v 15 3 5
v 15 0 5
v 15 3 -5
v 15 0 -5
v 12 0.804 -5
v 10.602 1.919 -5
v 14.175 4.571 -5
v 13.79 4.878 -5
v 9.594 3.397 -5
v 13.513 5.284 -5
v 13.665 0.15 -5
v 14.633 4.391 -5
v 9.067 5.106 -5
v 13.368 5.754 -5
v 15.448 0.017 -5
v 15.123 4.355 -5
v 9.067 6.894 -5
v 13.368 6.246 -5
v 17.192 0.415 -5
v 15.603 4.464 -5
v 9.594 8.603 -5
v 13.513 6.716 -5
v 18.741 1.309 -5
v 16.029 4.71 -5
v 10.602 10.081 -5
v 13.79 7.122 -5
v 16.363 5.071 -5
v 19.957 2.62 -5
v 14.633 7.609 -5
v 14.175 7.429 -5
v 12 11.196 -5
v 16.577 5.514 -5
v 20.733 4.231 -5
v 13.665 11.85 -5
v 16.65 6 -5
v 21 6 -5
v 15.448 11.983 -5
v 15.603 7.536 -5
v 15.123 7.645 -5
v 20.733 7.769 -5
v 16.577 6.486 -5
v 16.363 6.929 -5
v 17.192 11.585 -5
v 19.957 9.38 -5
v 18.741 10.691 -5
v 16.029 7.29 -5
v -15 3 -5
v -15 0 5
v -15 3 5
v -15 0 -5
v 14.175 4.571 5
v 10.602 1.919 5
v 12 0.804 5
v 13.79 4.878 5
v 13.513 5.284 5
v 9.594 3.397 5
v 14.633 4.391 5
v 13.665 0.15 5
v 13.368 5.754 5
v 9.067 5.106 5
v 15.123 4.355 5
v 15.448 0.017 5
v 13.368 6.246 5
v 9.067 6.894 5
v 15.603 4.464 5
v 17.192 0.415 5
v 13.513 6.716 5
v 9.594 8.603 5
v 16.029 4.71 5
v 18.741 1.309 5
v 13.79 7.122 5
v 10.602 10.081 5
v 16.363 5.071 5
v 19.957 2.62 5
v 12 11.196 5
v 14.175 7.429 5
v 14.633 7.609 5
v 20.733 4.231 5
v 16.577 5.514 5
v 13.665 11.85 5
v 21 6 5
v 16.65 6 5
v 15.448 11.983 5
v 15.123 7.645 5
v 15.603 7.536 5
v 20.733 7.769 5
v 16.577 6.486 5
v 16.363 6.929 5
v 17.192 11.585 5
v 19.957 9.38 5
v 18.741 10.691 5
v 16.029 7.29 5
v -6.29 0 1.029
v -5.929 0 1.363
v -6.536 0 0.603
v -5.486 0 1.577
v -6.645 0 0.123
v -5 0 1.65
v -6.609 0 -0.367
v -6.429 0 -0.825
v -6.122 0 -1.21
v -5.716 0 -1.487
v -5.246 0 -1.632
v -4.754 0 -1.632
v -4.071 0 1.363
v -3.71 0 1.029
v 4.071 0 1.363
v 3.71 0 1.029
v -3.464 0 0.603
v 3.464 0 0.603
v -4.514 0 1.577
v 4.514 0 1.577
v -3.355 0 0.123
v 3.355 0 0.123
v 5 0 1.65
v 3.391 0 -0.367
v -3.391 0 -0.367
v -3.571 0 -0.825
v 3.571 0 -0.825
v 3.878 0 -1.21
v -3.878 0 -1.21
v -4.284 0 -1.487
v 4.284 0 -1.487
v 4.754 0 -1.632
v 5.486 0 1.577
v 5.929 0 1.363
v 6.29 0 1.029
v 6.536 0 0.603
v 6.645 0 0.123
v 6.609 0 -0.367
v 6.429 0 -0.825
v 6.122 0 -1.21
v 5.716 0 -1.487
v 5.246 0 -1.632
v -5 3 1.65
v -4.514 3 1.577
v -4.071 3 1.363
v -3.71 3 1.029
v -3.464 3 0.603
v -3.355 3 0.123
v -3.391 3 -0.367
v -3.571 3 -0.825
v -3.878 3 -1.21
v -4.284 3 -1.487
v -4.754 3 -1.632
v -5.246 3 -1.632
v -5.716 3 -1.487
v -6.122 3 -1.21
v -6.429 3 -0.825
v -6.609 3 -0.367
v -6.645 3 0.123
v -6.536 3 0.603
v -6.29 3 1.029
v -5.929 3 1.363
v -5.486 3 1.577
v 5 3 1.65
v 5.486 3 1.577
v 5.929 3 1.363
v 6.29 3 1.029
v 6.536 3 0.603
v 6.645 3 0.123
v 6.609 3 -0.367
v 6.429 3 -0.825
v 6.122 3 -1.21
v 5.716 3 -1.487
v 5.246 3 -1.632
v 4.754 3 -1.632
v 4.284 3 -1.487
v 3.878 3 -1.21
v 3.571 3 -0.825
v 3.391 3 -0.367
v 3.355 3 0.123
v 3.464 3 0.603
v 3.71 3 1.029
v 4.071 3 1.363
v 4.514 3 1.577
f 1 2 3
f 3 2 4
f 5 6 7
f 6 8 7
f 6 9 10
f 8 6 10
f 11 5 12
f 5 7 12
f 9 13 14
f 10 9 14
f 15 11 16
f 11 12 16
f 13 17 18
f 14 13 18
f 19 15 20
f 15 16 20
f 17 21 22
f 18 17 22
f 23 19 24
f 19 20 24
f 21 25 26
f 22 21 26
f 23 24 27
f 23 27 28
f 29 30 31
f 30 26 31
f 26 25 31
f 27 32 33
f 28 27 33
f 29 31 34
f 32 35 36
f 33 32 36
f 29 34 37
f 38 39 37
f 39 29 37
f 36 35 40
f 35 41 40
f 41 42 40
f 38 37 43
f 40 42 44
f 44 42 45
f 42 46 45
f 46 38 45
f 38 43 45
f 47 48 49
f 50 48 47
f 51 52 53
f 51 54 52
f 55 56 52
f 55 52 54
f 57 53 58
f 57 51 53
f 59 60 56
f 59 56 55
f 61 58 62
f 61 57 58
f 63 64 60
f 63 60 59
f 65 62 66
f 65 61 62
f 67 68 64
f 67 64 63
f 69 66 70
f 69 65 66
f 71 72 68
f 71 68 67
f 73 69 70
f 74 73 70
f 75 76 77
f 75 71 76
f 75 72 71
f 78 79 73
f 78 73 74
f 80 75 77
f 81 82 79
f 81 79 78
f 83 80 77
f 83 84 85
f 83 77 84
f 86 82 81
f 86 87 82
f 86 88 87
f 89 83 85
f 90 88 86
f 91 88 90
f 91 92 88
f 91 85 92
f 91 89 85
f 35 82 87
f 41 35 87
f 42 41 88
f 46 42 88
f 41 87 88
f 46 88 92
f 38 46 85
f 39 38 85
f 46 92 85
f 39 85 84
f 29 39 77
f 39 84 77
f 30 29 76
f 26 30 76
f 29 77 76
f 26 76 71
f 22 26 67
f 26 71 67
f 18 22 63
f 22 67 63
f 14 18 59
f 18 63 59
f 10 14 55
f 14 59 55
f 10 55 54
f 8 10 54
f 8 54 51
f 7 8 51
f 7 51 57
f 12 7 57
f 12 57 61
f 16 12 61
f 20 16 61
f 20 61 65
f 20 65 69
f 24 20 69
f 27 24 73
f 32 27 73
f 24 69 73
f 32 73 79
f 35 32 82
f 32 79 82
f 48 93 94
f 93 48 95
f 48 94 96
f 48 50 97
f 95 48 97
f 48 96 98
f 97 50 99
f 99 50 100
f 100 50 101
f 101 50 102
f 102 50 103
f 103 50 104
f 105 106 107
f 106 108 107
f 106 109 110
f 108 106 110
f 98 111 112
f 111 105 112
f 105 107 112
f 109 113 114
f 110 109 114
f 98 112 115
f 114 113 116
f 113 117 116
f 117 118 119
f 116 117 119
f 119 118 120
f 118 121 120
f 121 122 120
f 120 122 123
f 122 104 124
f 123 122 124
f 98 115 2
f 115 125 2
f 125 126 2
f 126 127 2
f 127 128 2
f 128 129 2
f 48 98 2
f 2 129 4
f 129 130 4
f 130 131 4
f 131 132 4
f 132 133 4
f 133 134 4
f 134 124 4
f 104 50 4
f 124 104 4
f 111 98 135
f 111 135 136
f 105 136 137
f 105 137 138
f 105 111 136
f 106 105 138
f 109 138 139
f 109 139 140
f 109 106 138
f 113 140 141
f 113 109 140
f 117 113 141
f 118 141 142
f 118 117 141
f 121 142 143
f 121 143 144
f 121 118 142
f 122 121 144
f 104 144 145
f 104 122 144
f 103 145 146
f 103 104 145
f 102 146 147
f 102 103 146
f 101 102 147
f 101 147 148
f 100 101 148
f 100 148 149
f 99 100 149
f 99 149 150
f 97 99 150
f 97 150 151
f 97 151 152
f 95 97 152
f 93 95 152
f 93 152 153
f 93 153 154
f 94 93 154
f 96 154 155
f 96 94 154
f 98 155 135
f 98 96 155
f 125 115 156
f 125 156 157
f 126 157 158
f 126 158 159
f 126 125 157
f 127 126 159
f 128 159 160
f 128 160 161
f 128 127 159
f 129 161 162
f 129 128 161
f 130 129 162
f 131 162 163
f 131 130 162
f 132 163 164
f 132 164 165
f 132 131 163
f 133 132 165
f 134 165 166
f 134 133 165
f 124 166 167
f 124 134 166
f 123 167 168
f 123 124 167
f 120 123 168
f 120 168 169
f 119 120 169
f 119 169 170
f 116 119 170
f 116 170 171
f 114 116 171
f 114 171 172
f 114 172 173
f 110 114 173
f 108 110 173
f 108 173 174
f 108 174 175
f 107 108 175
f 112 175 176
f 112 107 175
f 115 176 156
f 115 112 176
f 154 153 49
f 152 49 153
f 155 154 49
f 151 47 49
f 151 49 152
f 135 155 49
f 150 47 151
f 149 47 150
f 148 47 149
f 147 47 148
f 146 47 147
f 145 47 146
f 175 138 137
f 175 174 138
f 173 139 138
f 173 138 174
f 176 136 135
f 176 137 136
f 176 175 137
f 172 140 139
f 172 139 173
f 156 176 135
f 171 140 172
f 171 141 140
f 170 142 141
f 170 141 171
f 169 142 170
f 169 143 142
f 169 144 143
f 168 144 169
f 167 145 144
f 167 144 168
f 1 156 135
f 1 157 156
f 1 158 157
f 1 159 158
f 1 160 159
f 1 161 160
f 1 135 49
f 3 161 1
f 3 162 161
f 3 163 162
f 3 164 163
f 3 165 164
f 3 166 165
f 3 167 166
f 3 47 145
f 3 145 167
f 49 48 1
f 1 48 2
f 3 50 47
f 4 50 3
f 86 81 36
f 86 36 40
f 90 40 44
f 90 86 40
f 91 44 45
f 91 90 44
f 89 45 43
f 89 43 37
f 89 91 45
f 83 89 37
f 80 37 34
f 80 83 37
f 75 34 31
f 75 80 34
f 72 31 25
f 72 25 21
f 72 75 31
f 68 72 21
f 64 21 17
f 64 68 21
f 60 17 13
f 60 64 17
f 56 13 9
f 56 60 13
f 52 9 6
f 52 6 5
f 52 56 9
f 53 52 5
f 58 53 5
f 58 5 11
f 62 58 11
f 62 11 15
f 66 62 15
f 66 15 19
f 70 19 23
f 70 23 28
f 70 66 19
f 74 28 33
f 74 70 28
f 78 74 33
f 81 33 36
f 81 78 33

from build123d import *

# Parameters (mm, degrees)
SKETCH_1_W      = 30
SKETCH_1_H      = 10
SKETCH_1_R      = 1.65
EXTRUDE_1_DEPTH = 3
SKETCH_2_R      = 6
SKETCH_2_R_2    = 1.65
EXTRUDE_2_DEPTH = 10


with BuildPart() as part:
    # 草图1 → 凸台-拉伸1 (new body)
    with BuildSketch(Plane(origin=(0, 0, 0), x_dir=(1, 0, 0), z_dir=(0, 1, 0))):
        Rectangle(SKETCH_1_W, SKETCH_1_H)
        with Locations(Location((-5, 0, 0), (0, 0, 270))):
            Circle(SKETCH_1_R, mode=Mode.SUBTRACT)
        with Locations(Location((5, 0, 0), (0, 0, 270))):
            Circle(SKETCH_1_R, mode=Mode.SUBTRACT)
    extrude(amount=EXTRUDE_1_DEPTH)


with BuildPart() as body_2:
    # 草图2 → 凸台-拉伸2 (new body)
    with BuildSketch(Plane.XY.offset(5)):
        with Locations((15, 6)):
            Circle(SKETCH_2_R)
        with Locations((15, 6)):
            Circle(SKETCH_2_R_2, mode=Mode.SUBTRACT)
    extrude(amount=-EXTRUDE_2_DEPTH)


solid = Compound([part.part, body_2.part])
